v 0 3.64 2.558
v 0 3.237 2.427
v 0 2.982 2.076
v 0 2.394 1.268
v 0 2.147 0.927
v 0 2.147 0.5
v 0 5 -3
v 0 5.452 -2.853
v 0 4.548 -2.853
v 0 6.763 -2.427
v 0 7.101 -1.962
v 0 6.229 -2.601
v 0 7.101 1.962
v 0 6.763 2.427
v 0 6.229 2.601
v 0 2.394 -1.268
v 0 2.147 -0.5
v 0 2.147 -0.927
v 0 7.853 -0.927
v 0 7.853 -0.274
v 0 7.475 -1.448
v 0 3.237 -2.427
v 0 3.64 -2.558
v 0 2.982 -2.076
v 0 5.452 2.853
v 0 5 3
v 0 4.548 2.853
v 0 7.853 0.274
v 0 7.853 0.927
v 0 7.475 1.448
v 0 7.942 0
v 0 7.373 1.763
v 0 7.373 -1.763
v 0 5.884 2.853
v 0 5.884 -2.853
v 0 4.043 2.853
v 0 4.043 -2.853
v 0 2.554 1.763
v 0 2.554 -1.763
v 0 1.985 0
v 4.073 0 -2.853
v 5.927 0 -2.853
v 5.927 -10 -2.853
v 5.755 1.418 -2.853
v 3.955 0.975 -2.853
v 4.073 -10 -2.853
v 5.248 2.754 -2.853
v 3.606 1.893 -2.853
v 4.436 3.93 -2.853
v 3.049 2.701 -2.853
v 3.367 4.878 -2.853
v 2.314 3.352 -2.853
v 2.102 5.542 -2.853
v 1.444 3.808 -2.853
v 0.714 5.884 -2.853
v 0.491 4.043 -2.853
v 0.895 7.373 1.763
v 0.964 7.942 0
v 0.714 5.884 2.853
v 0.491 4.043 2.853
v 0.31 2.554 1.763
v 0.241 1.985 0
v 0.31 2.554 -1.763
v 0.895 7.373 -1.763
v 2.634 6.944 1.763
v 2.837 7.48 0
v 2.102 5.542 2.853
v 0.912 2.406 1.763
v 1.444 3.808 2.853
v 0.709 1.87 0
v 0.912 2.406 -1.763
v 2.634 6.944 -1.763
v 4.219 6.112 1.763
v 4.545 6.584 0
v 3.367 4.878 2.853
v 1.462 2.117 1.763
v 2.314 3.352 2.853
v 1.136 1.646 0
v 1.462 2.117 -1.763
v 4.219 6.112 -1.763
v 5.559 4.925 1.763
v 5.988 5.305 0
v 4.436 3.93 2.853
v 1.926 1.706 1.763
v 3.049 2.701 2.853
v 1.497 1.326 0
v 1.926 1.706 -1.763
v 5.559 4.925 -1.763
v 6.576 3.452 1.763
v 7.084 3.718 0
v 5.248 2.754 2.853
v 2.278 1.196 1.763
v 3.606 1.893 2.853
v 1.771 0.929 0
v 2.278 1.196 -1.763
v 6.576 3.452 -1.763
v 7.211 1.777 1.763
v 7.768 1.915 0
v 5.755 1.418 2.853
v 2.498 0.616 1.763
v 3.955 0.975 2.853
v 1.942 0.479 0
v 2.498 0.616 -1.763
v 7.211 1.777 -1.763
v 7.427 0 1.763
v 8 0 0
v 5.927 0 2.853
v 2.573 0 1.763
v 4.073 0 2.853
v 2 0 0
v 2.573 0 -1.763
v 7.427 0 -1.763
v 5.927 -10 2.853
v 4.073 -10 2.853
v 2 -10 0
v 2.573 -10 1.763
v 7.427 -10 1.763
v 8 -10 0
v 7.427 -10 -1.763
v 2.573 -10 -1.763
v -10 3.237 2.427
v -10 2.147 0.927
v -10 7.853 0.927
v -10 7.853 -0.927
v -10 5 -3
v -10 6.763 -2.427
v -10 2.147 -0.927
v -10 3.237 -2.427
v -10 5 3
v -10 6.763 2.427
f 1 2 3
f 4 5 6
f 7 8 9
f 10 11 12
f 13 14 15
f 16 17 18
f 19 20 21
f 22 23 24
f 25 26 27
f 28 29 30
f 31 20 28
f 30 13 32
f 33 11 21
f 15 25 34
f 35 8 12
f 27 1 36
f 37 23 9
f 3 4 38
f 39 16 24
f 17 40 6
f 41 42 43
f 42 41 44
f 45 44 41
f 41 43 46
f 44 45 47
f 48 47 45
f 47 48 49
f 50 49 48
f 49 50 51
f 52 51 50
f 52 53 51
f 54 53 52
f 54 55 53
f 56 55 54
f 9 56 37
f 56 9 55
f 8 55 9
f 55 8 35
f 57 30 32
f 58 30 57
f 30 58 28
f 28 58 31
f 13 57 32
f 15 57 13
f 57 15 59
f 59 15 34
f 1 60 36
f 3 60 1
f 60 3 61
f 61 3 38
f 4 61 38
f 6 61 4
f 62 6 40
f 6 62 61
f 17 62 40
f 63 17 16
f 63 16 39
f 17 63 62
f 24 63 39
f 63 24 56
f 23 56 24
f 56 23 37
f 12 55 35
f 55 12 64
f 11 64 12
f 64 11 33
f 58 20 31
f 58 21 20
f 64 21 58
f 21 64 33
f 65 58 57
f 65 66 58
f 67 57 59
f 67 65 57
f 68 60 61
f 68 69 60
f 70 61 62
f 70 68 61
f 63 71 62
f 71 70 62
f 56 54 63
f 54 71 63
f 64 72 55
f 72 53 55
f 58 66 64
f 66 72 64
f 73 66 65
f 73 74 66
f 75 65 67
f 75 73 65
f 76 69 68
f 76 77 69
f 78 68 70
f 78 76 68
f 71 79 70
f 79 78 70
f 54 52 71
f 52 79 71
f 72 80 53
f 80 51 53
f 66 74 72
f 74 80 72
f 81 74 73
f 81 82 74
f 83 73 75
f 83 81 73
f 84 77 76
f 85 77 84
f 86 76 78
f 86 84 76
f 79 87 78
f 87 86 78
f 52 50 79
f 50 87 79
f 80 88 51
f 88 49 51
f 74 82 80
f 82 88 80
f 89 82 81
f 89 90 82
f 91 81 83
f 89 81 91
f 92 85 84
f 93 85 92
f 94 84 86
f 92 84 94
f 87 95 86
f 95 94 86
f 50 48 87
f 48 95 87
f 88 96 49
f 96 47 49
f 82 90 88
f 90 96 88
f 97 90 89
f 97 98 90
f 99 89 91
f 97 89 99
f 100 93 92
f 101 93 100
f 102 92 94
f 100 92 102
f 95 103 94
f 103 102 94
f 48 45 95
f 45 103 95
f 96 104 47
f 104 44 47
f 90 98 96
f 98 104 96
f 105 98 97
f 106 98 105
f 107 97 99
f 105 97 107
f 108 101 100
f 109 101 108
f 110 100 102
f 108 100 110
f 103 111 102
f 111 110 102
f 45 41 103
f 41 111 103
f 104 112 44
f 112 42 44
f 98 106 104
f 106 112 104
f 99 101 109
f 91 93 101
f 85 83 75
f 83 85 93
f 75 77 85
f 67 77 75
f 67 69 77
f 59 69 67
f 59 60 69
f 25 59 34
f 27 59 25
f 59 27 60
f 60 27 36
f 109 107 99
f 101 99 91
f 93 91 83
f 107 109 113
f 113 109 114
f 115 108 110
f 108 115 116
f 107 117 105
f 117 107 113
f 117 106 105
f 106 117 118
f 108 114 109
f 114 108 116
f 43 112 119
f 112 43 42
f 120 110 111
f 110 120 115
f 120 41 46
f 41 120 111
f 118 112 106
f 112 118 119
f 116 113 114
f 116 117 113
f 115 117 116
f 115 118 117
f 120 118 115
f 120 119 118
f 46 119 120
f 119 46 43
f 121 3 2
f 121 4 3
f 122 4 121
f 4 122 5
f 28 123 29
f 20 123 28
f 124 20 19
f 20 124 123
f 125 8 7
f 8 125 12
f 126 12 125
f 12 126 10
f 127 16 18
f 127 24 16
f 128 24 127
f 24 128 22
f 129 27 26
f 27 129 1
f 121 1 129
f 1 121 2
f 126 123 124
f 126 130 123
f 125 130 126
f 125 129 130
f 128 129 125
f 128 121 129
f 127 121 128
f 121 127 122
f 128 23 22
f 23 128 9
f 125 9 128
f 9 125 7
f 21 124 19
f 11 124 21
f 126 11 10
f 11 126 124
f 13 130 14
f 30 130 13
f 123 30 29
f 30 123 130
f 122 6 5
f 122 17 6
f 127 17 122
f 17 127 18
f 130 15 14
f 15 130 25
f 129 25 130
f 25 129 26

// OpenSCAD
translate([5,0,0])rotate([90,0,0,])cylinder(r=3, h= 10);
translate([-10,5,0])rotate([0,90,0,])cylinder(r=3, h= 10);
intersection(){translate([0,0,-20])cube(40);
    rotate_extrude()translate([5,0,0])circle(3);
}
